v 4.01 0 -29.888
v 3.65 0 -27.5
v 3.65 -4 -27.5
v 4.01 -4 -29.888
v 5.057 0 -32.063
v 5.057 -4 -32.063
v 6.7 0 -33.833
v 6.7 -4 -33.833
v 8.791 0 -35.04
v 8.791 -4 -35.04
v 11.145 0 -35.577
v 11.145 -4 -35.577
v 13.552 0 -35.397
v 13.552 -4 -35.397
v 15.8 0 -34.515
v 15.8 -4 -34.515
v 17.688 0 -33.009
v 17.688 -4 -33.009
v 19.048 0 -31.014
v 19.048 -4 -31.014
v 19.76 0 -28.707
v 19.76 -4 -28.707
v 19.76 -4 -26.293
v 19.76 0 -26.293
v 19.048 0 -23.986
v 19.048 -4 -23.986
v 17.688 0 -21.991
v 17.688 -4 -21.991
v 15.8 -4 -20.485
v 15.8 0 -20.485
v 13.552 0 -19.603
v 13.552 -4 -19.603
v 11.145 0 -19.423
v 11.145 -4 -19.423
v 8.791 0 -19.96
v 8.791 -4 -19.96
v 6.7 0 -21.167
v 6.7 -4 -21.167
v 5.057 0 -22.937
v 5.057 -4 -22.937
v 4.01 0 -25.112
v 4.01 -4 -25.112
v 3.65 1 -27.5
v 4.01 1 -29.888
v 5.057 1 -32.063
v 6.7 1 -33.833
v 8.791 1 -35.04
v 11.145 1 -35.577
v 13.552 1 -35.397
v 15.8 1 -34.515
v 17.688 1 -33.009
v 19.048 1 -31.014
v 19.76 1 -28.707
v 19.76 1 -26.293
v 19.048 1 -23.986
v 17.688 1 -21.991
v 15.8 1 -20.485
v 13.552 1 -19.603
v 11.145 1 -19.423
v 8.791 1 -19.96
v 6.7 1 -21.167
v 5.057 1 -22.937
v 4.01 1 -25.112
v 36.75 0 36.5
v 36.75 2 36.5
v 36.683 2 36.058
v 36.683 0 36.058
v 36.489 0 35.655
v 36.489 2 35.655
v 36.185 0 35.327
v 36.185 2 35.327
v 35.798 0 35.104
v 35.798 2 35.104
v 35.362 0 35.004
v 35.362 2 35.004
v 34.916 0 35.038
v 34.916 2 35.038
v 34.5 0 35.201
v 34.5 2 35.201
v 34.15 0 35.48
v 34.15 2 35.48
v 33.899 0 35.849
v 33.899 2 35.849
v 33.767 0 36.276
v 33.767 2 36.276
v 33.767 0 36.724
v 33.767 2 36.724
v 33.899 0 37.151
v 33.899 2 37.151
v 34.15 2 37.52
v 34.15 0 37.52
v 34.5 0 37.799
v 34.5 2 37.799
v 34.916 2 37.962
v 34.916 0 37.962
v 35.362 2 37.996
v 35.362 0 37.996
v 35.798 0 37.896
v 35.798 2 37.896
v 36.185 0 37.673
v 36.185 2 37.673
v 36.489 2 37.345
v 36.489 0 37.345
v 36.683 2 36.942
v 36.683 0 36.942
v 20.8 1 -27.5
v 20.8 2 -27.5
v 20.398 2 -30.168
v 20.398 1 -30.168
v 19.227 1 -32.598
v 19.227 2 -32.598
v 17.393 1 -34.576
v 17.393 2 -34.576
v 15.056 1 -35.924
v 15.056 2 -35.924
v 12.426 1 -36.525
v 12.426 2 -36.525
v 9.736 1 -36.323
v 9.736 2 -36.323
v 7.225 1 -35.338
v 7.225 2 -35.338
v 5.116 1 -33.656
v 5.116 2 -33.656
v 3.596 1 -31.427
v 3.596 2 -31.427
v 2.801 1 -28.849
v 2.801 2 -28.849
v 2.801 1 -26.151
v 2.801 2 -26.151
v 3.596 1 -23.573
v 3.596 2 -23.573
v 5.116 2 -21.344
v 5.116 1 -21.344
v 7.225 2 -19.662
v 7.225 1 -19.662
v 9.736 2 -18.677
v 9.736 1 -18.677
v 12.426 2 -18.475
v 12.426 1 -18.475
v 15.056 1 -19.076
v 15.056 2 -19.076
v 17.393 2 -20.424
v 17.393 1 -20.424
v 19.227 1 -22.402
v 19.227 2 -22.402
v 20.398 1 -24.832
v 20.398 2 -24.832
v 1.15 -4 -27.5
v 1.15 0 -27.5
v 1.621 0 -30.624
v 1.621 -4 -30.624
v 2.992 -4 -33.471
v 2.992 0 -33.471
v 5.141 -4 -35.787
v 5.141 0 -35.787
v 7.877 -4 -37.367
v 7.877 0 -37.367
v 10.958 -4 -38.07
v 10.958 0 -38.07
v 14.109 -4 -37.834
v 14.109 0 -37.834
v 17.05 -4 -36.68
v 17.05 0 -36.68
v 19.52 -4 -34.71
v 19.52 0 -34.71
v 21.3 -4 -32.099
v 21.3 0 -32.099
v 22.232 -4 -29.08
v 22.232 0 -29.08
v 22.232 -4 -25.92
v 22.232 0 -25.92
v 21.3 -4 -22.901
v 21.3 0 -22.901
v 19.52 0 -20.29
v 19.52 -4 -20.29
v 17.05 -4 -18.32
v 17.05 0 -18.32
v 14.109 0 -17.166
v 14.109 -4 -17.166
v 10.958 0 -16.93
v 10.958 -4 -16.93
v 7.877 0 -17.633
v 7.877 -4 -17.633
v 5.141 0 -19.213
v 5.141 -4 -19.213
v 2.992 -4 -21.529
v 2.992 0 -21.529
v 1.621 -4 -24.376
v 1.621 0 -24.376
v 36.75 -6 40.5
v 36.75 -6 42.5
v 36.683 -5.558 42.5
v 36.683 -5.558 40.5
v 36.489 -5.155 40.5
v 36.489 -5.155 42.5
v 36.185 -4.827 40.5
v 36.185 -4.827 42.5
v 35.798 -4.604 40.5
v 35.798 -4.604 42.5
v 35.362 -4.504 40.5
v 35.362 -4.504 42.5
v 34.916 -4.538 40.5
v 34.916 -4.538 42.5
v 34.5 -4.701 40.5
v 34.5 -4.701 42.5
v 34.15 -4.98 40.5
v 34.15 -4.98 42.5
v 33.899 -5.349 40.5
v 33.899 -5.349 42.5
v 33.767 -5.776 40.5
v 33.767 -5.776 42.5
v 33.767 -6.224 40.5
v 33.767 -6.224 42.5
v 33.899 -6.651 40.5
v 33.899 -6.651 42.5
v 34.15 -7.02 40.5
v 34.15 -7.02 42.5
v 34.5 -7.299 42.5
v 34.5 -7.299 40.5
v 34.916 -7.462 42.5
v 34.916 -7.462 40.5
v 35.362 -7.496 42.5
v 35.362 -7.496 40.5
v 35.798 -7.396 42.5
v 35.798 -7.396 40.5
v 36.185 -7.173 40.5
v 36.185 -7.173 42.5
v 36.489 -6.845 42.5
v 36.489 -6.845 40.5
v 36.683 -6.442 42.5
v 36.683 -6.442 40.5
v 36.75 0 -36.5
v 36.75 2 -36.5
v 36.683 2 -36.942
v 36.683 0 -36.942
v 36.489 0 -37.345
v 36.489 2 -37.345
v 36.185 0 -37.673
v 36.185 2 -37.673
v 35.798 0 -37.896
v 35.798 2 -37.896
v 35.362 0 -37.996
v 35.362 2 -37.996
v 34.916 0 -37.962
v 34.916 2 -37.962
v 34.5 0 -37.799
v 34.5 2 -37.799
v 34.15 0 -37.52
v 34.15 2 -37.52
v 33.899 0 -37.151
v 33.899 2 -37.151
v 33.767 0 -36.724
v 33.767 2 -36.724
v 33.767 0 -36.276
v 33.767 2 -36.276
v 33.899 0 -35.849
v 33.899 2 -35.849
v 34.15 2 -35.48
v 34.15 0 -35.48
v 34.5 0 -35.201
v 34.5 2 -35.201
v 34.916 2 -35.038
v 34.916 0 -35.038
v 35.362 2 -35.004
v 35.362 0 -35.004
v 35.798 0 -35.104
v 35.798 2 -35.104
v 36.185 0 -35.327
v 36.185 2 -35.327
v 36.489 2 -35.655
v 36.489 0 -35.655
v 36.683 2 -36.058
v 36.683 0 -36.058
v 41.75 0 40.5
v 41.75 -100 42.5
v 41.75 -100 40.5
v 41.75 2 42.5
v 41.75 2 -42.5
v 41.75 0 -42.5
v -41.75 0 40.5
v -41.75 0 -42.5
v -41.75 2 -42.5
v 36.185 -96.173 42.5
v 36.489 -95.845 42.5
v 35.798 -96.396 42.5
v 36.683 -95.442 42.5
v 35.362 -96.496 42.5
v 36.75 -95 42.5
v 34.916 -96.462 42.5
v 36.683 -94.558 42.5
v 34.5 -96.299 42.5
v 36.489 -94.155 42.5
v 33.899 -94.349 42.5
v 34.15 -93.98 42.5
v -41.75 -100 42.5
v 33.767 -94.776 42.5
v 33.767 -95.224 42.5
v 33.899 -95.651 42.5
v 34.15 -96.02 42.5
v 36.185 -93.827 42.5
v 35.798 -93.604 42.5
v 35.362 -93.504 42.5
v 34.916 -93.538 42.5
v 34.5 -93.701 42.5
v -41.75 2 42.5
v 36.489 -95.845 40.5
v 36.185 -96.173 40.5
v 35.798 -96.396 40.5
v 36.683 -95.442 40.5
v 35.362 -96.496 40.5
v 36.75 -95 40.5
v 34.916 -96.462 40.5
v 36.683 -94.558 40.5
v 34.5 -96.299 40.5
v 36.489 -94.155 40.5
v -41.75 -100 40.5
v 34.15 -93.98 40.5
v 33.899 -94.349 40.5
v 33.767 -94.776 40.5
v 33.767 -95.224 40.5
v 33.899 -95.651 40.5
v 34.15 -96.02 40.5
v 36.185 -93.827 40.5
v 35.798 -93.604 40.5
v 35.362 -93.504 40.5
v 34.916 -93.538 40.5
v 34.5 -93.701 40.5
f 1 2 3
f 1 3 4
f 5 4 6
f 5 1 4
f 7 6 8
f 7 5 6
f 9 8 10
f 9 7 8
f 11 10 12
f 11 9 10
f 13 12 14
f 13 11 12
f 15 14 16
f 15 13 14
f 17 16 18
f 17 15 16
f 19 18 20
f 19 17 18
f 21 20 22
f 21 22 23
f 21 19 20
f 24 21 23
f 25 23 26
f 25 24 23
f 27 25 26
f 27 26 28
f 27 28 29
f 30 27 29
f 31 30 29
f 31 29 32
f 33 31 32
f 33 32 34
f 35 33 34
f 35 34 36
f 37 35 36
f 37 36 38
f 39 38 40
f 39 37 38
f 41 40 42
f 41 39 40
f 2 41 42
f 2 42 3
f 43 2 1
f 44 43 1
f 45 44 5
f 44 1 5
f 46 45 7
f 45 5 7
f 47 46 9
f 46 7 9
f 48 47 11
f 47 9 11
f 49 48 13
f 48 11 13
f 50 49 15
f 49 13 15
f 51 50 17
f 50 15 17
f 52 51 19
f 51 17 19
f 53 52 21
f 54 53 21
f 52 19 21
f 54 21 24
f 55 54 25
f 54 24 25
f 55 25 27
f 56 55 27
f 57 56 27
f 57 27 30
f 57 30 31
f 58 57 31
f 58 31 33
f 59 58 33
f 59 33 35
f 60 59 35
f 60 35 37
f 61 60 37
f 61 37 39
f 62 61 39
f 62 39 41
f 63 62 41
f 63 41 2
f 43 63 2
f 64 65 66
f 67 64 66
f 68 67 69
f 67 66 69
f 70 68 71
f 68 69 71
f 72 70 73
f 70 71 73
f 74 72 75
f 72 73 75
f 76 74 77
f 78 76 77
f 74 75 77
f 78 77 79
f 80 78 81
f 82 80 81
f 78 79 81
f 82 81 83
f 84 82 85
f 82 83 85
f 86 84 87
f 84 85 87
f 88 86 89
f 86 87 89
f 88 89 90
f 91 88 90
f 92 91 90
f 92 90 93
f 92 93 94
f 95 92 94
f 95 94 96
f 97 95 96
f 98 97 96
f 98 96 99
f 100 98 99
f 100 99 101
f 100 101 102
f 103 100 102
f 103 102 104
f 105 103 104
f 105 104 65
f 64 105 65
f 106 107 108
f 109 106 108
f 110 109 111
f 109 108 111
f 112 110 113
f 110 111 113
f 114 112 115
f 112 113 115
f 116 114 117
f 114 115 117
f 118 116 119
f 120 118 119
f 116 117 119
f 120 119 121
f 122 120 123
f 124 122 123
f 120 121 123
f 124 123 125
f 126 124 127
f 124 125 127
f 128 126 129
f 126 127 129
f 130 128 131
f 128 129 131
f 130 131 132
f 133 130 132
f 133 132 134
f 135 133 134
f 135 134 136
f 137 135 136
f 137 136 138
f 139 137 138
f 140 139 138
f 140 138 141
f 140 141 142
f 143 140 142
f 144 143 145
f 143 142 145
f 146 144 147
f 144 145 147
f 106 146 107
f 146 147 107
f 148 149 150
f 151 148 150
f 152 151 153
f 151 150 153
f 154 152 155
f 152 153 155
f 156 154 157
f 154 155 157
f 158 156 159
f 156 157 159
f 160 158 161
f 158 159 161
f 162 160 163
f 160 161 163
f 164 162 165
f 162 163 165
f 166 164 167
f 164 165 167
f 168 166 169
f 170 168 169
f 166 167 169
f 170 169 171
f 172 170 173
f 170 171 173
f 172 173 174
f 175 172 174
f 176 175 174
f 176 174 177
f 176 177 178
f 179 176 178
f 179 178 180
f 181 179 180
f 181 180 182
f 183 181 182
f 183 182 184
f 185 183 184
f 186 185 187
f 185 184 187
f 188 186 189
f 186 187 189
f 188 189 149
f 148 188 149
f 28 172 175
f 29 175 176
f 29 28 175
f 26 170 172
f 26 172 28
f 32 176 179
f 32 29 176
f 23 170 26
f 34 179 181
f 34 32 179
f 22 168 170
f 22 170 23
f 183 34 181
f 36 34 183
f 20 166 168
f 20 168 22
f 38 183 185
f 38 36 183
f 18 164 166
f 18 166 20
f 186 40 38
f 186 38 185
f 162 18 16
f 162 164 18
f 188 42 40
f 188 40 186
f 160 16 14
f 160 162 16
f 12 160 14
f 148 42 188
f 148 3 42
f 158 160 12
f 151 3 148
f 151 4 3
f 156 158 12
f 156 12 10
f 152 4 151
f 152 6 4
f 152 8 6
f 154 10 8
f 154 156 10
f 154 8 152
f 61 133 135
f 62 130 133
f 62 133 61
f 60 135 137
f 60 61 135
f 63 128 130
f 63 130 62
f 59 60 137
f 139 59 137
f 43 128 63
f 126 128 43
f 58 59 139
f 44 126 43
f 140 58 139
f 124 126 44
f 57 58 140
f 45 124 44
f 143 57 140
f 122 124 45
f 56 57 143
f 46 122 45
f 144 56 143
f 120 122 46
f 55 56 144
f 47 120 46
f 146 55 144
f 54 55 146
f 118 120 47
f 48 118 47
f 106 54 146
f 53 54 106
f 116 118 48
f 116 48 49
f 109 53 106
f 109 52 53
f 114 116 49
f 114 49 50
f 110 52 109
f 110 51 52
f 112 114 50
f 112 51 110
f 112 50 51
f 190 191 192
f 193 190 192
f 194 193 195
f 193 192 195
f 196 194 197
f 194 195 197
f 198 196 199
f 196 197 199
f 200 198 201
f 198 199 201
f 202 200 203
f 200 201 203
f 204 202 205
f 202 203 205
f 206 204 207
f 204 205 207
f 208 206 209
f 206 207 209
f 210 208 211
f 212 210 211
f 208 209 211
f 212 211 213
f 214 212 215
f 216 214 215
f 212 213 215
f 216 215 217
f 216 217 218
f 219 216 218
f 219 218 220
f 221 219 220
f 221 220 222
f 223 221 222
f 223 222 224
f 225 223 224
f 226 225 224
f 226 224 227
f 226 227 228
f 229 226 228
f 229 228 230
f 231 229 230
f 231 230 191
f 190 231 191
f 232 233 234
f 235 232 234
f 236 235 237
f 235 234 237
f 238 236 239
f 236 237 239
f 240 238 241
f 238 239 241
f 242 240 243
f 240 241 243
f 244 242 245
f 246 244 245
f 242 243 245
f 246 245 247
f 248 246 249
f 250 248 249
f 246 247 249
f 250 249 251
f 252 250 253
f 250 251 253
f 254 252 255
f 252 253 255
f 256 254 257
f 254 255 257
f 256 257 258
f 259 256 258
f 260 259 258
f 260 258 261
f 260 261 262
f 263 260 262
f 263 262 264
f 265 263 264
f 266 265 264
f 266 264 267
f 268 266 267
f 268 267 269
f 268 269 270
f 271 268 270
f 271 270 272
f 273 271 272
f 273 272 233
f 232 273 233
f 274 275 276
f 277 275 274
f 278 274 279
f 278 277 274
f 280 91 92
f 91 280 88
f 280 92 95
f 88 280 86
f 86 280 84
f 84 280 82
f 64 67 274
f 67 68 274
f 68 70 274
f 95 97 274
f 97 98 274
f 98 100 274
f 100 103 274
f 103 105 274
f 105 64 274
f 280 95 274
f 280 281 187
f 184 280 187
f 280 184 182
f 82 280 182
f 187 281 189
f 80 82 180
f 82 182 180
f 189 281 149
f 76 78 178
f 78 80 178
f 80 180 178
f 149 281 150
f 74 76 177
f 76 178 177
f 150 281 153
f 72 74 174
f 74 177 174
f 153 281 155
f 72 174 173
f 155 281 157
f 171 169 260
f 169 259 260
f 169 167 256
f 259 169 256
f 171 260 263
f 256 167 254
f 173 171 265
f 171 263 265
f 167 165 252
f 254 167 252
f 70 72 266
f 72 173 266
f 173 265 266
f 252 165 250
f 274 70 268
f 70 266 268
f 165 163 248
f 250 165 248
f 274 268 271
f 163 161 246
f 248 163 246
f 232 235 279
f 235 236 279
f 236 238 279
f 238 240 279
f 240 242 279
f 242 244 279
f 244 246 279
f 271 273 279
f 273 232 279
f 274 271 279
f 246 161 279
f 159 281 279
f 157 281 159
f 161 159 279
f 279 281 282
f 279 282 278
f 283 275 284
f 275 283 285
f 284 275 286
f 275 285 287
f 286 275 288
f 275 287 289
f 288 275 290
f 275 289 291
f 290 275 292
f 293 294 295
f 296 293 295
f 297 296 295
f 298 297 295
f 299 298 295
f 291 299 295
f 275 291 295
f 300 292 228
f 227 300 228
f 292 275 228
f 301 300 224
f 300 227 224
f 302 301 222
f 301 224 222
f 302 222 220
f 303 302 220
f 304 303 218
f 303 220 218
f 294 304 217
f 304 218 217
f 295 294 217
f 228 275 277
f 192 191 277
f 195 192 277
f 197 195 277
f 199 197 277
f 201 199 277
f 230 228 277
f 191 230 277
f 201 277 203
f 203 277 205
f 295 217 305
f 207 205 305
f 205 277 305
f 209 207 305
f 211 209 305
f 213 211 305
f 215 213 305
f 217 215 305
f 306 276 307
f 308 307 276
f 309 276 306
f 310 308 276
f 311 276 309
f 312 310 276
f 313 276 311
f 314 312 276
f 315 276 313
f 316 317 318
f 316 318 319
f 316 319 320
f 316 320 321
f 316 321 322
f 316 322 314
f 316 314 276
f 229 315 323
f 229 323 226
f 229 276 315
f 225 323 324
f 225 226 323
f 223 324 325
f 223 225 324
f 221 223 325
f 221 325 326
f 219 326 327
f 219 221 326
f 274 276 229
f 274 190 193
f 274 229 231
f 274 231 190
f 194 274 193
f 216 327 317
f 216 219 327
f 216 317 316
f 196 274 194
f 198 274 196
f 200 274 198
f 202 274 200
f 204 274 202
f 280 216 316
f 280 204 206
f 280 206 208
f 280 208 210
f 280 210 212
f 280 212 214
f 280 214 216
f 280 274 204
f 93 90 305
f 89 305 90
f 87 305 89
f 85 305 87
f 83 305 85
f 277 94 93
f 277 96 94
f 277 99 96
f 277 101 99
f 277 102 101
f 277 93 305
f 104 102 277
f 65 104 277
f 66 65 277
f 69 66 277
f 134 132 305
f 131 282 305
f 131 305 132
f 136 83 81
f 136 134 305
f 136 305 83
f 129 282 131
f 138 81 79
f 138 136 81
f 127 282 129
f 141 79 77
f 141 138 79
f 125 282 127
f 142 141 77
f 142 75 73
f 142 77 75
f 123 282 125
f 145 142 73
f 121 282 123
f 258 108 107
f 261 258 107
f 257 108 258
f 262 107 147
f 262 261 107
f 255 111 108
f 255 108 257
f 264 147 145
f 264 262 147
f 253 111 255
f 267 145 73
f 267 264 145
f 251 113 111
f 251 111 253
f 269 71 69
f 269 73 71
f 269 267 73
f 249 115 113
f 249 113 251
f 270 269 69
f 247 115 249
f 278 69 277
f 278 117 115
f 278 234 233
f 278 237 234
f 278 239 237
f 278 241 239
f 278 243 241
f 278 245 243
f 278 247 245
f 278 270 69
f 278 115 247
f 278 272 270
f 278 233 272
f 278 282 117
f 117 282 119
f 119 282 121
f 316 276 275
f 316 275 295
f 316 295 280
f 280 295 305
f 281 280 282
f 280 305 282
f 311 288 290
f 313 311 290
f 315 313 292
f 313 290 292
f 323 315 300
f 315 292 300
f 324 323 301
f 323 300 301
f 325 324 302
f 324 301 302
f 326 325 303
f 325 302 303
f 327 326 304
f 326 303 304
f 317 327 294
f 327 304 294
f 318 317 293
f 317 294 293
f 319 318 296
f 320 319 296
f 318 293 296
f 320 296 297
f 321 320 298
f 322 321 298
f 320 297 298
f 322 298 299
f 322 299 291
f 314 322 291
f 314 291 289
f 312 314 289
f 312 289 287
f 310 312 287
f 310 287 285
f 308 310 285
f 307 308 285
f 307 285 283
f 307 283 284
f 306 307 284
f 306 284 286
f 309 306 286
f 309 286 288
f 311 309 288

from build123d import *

# Parameters (mm, degrees)
SKETCH1_W               = 83.5
SKETCH1_H               = 85
BOSS_EXTRUDE1_DEPTH     = 2
SKETCH2_W               = 83.5
SKETCH2_H               = 2
BOSS_EXTRUDE2_DEPTH     = 100
SKETCH3_R               = 8.1
SKETCH3_R_2             = 10.6
BOSS_EXTRUDE3_DEPTH     = 4
SKETCH3_3_R             = 8.1
CUT_EXTRUDE3_DEPTH      = 101
CUT_EXTRUDE3_DEPTH_BACK = 3
SKETCH4_R               = 9.05
CUT_EXTRUDE4_DEPTH      = 1
CUT_EXTRUDE5_REACH      = 87
SKETCH5_R               = 1.5
CUT_EXTRUDE6_REACH      = 104
SKETCH6_R               = 1.5


with BuildPart() as part:
    # Sketch1 → Boss-Extrude1 (new body)
    with BuildSketch(Plane(origin=(0, 0, 0), x_dir=(1, 0, 0), z_dir=(0, 1, 0))):
        Rectangle(SKETCH1_W, SKETCH1_H)
    extrude(amount=BOSS_EXTRUDE1_DEPTH)

    # Sketch2 → Boss-Extrude2 (add)
    with BuildSketch(Plane(origin=(0, 0, 0), x_dir=(-1, 0, 0), z_dir=(0, -1, 0))):
        with Locations((0, -41.5)):
            Rectangle(SKETCH2_W, SKETCH2_H)
    extrude(amount=BOSS_EXTRUDE2_DEPTH)

    # Sketch3 → Boss-Extrude3 (add)
    with BuildSketch(Plane(origin=(0, 0, 0), x_dir=(-1, 0, 0), z_dir=(0, -1, 0))):
        with Locations((-11.75, 27.5)):
            Circle(SKETCH3_R)
        with Locations((-11.75, 27.5)):
            Circle(SKETCH3_R_2)
        with Locations((-11.75, 27.5)):
            Circle(SKETCH3_R, mode=Mode.SUBTRACT)
    extrude(amount=BOSS_EXTRUDE3_DEPTH)

    # Sketch3<3> → Cut-Extrude3 (cut, two sides)
    with BuildSketch(Plane(origin=(0, 0, 0), x_dir=(-1, 0, 0), z_dir=(0, -1, 0))) as cut_extrude3_sk:
        with Locations((-11.75, 27.5)):
            Circle(SKETCH3_3_R)
    extrude(amount=CUT_EXTRUDE3_DEPTH, mode=Mode.SUBTRACT)
    extrude(cut_extrude3_sk.sketch, amount=-CUT_EXTRUDE3_DEPTH_BACK, mode=Mode.SUBTRACT)

    # Sketch4 → Cut-Extrude4 (cut)
    with BuildSketch(Plane(origin=(0, 2, 0), x_dir=(1, 0, 0), z_dir=(0, 1, 0))):
        with Locations((11.75, 27.5)):
            Circle(SKETCH4_R)
    extrude(amount=-CUT_EXTRUDE4_DEPTH, mode=Mode.SUBTRACT)

    # Sketch5 → Cut-Extrude5 (cut, up to next)
    with BuildSketch(Plane.XY.offset(42.5), mode=Mode.PRIVATE) as cut_extrude5_sk1:
        with Locations((35.25, -95)):
            Circle(SKETCH5_R)
    cut_extrude5_tool1 = extrude(cut_extrude5_sk1.sketch, amount=-CUT_EXTRUDE5_REACH, mode=Mode.PRIVATE) & part.part
    add(cut_extrude5_tool1.solids().sort_by_distance((35.25, -95, 42.5))[0], mode=Mode.SUBTRACT)
    # Sketch5 → Cut-Extrude5 (cut, up to next)
    with BuildSketch(Plane.XY.offset(42.5), mode=Mode.PRIVATE) as cut_extrude5_sk2:
        with Locations((35.25, -6)):
            Circle(SKETCH5_R)
    cut_extrude5_tool2 = extrude(cut_extrude5_sk2.sketch, amount=-CUT_EXTRUDE5_REACH, mode=Mode.PRIVATE) & part.part
    add(cut_extrude5_tool2.solids().sort_by_distance((35.25, -6, 42.5))[0], mode=Mode.SUBTRACT)

    # Sketch6 → Cut-Extrude6 (cut, up to next)
    with BuildSketch(Plane(origin=(0, 2, 0), x_dir=(1, 0, 0), z_dir=(0, 1, 0)), mode=Mode.PRIVATE) as cut_extrude6_sk1:
        with Locations((35.25, -36.5)):
            Circle(SKETCH6_R)
    cut_extrude6_tool1 = extrude(cut_extrude6_sk1.sketch, amount=-CUT_EXTRUDE6_REACH, mode=Mode.PRIVATE) & part.part
    add(cut_extrude6_tool1.solids().sort_by_distance((35.25, 2, 36.5))[0], mode=Mode.SUBTRACT)
    # Sketch6 → Cut-Extrude6 (cut, up to next)
    with BuildSketch(Plane(origin=(0, 2, 0), x_dir=(1, 0, 0), z_dir=(0, 1, 0)), mode=Mode.PRIVATE) as cut_extrude6_sk2:
        with Locations((35.25, 36.5)):
            Circle(SKETCH6_R)
    cut_extrude6_tool2 = extrude(cut_extrude6_sk2.sketch, amount=-CUT_EXTRUDE6_REACH, mode=Mode.PRIVATE) & part.part
    add(cut_extrude6_tool2.solids().sort_by_distance((35.25, 2, -36.5))[0], mode=Mode.SUBTRACT)


solid = part.part
